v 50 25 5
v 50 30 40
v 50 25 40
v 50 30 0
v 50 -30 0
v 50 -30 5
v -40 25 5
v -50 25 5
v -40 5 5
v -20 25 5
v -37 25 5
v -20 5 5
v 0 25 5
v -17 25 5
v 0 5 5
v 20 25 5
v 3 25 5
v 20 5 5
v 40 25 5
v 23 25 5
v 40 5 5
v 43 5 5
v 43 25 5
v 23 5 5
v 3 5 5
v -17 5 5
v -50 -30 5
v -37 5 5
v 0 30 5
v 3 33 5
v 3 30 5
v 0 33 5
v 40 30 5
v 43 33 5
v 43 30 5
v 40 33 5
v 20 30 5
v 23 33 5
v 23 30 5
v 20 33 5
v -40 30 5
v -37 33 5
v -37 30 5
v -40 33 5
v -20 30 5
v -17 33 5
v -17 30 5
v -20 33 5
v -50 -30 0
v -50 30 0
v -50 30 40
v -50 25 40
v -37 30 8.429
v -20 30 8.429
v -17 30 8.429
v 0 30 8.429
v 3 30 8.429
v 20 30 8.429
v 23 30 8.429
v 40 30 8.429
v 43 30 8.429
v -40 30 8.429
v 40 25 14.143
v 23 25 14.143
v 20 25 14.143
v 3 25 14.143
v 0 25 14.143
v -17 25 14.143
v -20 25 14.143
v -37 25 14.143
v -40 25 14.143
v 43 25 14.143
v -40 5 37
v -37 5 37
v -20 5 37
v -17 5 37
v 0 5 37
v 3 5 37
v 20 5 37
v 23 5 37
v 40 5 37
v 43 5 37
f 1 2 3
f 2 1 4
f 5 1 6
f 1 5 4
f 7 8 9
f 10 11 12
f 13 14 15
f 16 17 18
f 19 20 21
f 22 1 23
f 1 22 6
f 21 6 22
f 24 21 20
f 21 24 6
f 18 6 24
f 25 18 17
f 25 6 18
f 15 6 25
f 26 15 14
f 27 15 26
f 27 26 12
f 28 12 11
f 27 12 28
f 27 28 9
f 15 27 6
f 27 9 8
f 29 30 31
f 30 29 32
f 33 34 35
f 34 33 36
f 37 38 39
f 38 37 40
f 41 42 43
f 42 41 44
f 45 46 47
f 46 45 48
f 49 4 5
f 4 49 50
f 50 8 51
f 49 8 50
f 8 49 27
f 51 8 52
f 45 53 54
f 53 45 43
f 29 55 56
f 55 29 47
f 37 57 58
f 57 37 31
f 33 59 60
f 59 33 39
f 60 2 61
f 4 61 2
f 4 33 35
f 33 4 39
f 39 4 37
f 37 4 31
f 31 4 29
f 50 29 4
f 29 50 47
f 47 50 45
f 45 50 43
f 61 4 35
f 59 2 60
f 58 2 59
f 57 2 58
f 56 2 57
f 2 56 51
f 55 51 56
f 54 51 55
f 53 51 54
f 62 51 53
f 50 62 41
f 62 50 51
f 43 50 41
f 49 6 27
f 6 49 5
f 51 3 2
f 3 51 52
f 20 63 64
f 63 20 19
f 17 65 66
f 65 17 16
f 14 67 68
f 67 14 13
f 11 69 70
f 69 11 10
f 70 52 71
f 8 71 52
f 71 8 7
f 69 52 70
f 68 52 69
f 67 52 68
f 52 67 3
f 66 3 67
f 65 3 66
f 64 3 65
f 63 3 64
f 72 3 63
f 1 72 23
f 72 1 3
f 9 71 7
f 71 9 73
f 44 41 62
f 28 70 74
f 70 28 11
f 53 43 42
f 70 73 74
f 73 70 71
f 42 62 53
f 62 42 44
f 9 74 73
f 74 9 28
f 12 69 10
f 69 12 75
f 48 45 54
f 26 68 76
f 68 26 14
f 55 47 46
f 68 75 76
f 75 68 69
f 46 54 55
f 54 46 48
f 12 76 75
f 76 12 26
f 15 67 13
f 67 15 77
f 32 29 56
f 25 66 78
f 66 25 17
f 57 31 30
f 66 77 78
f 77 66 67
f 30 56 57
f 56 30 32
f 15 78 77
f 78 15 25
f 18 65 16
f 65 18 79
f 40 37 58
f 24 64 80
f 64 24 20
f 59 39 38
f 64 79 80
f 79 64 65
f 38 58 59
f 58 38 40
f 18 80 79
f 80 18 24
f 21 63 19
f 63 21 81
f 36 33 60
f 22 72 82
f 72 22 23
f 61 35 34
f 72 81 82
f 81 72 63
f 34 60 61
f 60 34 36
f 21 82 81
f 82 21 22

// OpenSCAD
// Generated with SolidPython2 for OpenSCAD task-038
$fn = 64;

union() {
	union() {
		translate(v = [-50.0, -30.0, 0]) {
			cube(size = [100, 60, 5]);
		}
		translate(v = [-50, 25, 5]) {
			cube(size = [100, 5, 35]);
		}
	}
	translate(v = [-40, 5, 5]) {
		rotate(a = [90, 0, 90]) {
			linear_extrude(height = 3) {
				polygon(points = [[0, 0], [28, 0], [0, 32]]);
			}
		}
	}
	translate(v = [-20, 5, 5]) {
		rotate(a = [90, 0, 90]) {
			linear_extrude(height = 3) {
				polygon(points = [[0, 0], [28, 0], [0, 32]]);
			}
		}
	}
	translate(v = [0, 5, 5]) {
		rotate(a = [90, 0, 90]) {
			linear_extrude(height = 3) {
				polygon(points = [[0, 0], [28, 0], [0, 32]]);
			}
		}
	}
	translate(v = [20, 5, 5]) {
		rotate(a = [90, 0, 90]) {
			linear_extrude(height = 3) {
				polygon(points = [[0, 0], [28, 0], [0, 32]]);
			}
		}
	}
	translate(v = [40, 5, 5]) {
		rotate(a = [90, 0, 90]) {
			linear_extrude(height = 3) {
				polygon(points = [[0, 0], [28, 0], [0, 32]]);
			}
		}
	}
}
